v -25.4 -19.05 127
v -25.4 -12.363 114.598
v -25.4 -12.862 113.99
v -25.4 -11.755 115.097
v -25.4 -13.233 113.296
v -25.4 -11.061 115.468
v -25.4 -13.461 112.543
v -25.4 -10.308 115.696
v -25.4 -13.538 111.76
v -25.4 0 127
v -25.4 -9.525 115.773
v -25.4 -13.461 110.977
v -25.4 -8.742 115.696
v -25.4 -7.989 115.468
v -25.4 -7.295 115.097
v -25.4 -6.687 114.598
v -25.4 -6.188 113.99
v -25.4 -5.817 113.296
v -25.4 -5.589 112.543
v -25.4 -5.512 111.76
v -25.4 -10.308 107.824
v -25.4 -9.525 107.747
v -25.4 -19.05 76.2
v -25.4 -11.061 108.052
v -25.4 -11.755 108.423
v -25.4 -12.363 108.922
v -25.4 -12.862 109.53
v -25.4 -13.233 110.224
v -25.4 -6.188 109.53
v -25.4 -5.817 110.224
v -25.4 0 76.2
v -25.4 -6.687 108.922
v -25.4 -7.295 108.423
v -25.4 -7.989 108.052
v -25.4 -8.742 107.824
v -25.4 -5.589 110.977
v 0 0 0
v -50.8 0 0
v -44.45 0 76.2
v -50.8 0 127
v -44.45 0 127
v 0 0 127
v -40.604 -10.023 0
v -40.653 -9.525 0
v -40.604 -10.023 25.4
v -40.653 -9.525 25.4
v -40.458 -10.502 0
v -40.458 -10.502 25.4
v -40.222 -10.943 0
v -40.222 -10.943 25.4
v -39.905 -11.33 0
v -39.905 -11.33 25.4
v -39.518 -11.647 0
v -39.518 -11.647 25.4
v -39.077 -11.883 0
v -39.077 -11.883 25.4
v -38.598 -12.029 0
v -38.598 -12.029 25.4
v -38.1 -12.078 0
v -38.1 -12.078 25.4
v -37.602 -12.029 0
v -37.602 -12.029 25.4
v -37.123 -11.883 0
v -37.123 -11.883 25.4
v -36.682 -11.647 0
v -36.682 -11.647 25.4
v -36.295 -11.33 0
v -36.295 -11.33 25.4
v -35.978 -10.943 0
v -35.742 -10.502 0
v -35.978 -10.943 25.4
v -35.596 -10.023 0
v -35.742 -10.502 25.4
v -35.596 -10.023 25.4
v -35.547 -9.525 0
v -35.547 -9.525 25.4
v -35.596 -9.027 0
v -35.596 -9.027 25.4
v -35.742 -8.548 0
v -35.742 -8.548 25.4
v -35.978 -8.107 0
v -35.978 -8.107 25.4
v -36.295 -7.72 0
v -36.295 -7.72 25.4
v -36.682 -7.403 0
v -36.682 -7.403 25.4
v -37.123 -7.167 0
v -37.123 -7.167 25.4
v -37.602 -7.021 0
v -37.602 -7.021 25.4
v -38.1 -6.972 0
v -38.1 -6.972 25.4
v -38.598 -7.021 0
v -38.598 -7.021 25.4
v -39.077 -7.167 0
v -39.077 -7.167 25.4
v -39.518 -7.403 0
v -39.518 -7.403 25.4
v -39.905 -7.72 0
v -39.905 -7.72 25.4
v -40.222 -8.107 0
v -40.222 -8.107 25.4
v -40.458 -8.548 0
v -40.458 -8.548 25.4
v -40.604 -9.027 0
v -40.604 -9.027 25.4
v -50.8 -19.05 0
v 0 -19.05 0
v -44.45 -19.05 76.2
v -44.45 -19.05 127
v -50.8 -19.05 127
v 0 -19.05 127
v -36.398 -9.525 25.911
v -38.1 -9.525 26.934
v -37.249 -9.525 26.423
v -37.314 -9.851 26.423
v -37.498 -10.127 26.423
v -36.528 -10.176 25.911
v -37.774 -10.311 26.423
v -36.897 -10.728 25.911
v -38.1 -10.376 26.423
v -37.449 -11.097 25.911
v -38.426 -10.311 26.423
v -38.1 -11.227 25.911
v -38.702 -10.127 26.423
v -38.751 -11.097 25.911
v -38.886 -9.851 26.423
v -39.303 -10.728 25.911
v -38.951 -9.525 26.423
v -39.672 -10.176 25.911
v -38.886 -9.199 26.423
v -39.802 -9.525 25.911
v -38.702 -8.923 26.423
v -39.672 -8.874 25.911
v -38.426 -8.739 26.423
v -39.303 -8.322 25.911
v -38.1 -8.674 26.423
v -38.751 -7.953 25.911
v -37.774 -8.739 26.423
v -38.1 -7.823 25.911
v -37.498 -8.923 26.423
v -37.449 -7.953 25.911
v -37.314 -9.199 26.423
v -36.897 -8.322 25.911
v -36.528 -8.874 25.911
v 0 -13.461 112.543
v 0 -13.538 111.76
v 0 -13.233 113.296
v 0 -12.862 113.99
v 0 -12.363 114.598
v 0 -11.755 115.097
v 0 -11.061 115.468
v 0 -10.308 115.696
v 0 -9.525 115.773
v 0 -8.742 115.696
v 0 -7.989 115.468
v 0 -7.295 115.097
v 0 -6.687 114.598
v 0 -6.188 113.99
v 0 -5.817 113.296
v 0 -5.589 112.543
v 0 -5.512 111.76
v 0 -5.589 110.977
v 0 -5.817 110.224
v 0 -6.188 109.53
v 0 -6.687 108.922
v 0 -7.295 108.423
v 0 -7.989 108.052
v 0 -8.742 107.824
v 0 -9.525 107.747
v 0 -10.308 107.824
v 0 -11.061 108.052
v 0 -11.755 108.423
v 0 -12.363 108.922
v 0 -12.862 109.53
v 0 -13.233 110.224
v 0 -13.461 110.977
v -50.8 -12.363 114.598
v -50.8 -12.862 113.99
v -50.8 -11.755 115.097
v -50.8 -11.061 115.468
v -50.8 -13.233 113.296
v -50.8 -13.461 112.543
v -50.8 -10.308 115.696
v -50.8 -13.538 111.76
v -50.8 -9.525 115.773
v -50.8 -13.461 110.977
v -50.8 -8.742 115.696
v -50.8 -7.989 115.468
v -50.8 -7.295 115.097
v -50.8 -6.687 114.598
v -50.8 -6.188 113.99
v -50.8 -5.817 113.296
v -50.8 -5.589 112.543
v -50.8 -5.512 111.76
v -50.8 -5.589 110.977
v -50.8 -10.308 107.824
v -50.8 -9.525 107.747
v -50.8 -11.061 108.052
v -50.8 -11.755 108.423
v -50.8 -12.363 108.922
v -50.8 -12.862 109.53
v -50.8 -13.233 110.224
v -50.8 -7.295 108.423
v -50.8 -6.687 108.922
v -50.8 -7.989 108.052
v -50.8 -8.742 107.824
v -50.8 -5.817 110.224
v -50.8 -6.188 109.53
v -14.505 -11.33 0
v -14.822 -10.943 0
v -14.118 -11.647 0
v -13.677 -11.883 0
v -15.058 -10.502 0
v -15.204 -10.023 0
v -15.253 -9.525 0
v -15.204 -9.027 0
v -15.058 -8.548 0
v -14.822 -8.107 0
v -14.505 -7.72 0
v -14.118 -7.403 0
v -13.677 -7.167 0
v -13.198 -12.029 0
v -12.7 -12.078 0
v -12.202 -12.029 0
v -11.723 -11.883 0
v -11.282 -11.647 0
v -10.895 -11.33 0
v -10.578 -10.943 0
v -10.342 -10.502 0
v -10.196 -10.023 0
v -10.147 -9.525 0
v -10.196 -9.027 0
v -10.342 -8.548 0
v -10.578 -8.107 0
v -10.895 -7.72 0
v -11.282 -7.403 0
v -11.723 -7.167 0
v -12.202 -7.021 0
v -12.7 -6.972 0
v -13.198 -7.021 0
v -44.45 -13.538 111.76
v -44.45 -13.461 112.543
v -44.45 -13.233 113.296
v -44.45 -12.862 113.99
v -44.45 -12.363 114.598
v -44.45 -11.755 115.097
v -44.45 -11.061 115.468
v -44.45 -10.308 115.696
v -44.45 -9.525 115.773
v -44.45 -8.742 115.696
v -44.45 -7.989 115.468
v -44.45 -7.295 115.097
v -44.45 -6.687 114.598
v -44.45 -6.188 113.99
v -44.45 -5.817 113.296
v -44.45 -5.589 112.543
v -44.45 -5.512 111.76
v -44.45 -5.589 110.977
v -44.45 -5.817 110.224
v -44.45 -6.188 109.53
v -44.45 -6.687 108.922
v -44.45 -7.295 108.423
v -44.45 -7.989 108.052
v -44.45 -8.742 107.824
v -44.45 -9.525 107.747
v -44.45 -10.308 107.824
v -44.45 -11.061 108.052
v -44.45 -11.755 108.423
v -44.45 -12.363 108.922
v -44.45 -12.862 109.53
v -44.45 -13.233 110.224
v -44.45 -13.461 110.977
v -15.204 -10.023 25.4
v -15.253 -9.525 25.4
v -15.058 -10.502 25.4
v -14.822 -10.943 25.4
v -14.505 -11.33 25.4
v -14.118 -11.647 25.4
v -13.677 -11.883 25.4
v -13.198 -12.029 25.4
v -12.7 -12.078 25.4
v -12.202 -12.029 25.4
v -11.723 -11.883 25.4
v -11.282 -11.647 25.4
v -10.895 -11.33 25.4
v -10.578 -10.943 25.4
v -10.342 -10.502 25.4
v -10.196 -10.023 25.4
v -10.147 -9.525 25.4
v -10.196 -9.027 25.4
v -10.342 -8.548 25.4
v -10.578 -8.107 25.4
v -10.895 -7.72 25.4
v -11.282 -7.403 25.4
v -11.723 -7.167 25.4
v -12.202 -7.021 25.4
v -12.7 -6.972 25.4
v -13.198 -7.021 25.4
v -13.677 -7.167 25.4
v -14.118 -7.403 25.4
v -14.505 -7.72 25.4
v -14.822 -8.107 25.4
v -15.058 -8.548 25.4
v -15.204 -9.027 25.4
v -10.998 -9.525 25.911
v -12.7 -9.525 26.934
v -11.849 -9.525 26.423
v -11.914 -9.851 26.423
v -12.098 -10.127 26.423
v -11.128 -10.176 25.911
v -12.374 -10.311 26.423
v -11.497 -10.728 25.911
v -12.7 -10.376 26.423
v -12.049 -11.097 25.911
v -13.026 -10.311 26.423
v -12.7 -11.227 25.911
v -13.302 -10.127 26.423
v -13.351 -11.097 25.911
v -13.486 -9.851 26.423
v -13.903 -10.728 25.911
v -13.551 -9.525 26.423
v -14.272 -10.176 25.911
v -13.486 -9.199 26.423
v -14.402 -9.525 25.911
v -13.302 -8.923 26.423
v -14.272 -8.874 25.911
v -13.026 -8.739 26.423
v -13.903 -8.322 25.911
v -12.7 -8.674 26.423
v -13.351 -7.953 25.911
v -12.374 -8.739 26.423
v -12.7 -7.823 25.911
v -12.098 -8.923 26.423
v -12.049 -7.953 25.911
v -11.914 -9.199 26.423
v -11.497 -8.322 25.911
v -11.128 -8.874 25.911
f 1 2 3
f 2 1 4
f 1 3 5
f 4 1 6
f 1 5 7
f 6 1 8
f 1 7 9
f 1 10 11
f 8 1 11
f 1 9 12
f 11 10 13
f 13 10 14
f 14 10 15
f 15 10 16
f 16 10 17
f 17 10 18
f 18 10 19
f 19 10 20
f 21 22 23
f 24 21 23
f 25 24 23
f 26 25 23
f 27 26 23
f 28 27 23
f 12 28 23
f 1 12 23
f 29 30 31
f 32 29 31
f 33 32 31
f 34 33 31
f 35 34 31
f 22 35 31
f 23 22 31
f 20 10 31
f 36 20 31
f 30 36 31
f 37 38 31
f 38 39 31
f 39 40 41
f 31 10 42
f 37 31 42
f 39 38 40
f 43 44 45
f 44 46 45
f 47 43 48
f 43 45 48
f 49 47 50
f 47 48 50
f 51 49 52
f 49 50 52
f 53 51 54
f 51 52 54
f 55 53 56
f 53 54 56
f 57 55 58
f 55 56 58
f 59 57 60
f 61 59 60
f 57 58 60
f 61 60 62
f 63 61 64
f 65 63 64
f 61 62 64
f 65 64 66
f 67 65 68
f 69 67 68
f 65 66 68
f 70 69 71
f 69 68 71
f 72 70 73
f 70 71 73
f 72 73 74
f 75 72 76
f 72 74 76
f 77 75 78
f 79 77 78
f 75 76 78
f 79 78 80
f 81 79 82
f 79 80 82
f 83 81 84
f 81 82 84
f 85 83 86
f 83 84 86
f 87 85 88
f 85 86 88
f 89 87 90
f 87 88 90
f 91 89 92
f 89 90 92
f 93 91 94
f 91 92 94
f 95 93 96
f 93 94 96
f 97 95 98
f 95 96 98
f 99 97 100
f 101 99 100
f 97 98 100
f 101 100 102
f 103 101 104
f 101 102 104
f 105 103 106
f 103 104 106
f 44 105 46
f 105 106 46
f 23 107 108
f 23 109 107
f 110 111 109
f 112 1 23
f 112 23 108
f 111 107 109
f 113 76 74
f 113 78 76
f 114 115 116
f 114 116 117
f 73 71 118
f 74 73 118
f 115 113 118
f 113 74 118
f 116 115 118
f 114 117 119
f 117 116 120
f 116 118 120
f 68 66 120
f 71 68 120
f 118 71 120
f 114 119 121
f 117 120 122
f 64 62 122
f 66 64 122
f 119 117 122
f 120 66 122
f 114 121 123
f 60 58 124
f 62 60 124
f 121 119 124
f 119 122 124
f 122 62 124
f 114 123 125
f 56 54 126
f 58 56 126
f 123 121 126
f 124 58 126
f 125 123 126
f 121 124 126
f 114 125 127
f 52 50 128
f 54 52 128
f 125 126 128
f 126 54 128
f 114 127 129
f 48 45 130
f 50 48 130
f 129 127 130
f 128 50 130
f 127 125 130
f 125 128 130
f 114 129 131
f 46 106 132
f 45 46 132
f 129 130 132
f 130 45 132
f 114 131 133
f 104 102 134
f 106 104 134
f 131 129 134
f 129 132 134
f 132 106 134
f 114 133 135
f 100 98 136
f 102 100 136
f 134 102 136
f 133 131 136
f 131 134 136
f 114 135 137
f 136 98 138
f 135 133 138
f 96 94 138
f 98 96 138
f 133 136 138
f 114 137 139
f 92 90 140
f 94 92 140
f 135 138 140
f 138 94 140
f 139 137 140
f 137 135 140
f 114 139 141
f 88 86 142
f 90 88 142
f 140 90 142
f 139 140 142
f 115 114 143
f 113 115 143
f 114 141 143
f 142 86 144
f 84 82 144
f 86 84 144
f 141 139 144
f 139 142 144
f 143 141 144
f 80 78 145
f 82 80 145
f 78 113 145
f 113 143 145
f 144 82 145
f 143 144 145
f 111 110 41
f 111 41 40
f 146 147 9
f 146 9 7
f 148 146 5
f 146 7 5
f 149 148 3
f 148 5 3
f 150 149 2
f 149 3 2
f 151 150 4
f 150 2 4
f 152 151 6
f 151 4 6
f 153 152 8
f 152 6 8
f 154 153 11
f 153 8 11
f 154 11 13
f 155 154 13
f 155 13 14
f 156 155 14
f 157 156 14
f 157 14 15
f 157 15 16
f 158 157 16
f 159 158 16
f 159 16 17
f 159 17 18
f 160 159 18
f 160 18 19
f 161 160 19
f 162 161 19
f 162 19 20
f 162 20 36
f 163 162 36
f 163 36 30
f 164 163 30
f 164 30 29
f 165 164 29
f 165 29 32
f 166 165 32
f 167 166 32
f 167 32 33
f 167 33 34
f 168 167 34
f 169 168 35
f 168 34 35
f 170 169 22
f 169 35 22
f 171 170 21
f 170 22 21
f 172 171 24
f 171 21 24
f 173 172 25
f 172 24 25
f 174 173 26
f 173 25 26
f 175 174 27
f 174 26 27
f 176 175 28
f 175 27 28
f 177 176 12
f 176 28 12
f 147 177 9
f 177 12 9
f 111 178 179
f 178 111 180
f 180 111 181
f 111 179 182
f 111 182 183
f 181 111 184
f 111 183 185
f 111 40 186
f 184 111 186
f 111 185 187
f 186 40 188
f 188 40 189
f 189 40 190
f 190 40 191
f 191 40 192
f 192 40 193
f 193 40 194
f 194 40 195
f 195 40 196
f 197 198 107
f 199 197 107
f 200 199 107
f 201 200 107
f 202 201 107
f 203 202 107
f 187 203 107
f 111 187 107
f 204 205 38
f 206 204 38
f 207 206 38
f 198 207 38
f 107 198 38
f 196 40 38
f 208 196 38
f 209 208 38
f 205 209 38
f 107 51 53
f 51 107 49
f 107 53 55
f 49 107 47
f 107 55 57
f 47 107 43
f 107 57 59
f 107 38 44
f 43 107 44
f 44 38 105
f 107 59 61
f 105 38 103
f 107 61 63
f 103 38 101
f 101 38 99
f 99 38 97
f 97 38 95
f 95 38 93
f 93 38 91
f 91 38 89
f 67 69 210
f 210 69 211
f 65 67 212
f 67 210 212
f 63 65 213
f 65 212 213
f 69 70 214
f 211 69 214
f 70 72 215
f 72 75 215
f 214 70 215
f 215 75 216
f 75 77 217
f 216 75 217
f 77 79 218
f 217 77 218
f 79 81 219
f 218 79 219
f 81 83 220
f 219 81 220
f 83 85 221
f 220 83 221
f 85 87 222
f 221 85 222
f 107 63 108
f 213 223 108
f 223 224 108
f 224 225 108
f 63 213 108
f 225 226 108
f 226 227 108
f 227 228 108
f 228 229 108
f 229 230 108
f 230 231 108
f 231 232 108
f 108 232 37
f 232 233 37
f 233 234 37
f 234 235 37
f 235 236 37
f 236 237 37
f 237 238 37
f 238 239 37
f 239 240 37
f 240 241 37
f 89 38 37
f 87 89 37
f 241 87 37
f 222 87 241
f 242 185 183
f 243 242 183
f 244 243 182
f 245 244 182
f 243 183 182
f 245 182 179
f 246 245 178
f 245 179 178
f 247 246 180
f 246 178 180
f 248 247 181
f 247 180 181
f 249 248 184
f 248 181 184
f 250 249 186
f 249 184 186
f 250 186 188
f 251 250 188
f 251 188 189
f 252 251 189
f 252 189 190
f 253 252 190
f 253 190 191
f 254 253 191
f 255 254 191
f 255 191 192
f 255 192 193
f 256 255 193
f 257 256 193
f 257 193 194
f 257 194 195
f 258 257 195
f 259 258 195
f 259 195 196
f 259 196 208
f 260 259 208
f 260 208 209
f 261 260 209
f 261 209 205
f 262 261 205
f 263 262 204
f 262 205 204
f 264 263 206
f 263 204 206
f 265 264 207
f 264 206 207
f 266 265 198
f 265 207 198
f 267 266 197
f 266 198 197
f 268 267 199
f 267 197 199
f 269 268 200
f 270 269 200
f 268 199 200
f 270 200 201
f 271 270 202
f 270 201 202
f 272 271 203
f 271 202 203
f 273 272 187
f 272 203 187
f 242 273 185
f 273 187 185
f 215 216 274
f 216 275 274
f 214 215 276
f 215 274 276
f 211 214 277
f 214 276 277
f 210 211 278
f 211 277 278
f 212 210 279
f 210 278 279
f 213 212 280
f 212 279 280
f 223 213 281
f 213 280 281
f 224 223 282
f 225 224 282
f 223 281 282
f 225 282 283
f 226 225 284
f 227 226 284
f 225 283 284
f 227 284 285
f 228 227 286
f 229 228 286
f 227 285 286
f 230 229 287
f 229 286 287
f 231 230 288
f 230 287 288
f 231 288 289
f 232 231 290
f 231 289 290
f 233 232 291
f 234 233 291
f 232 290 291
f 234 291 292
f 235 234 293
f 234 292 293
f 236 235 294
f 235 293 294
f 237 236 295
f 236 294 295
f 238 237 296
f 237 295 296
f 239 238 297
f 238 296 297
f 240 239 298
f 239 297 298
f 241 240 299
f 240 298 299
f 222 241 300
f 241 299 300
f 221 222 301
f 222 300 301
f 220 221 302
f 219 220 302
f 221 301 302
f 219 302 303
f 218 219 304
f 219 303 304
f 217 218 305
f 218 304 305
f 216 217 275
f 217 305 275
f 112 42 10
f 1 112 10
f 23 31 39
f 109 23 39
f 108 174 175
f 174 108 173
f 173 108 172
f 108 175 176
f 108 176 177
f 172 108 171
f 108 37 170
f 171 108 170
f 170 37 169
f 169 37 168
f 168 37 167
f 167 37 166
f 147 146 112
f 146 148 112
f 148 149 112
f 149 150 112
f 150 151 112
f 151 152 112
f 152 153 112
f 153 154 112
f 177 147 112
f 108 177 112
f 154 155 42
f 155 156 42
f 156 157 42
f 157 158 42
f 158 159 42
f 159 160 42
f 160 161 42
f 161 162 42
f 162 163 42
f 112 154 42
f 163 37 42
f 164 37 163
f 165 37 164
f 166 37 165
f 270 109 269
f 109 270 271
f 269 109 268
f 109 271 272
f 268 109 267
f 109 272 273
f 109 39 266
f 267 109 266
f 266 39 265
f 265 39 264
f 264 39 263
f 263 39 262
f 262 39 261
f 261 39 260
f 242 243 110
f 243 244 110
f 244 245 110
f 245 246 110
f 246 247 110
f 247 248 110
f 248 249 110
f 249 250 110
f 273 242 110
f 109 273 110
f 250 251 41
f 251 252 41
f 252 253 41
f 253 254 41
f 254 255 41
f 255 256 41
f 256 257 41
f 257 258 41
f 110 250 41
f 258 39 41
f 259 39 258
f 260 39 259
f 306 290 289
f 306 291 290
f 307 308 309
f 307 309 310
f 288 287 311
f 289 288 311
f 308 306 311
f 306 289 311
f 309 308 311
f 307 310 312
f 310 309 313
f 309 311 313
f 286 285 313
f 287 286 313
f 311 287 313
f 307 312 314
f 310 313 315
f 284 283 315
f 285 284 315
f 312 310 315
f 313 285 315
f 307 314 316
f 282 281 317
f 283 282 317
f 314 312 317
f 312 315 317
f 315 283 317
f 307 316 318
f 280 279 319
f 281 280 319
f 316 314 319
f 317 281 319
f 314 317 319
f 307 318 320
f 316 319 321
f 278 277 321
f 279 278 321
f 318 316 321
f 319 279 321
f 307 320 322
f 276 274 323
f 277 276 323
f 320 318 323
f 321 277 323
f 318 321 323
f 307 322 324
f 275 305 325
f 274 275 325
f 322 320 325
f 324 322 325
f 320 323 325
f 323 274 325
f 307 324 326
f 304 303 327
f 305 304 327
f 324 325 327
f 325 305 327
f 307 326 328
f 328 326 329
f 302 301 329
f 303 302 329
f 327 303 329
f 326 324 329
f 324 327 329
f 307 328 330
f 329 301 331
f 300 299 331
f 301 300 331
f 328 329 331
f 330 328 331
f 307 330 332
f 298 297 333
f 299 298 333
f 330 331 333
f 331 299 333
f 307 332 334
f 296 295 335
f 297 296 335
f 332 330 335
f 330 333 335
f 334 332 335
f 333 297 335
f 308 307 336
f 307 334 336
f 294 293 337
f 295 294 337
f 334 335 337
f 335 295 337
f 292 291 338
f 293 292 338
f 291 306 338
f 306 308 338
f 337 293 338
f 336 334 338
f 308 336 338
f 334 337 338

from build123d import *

# Parameters (mm, degrees)
F1_DEPTH = 19.05
F3_D     = 8.0264
F5_D     = 5.1054
F5_DEPTH = 25.4
F5_TIP   = 1.5338169022


with BuildPart() as f1:
    # F0 (on Front) → F1 (new body)
    with BuildSketch(Plane.XZ):
        Polygon((-50.8, 0), (0, 0), (0, 127), (-25.4, 127), (-25.4, 76.2), (-44.45, 76.2), (-44.45, 127), (-50.8, 127), align=None)
    extrude(amount=F1_DEPTH)

    # F3 (through all)
    with Locations(Plane.YZ):
        with Locations((-9.525, 111.76)):
            Hole(F3_D / 2)

    # F5
    with Locations(Plane(origin=(0, 0, 0), x_dir=(1, 0, 0), z_dir=(0, 0, -1))):
        with Locations((-38.1, 9.525), (-12.7, 9.525)):
            Hole(F5_D / 2, depth=F5_DEPTH)
            with Locations((0, 0, -(F5_DEPTH + F5_TIP / 2))):  # 118° drill point
                Cone(0, F5_D / 2, F5_TIP, mode=Mode.SUBTRACT)


solid = f1.part
